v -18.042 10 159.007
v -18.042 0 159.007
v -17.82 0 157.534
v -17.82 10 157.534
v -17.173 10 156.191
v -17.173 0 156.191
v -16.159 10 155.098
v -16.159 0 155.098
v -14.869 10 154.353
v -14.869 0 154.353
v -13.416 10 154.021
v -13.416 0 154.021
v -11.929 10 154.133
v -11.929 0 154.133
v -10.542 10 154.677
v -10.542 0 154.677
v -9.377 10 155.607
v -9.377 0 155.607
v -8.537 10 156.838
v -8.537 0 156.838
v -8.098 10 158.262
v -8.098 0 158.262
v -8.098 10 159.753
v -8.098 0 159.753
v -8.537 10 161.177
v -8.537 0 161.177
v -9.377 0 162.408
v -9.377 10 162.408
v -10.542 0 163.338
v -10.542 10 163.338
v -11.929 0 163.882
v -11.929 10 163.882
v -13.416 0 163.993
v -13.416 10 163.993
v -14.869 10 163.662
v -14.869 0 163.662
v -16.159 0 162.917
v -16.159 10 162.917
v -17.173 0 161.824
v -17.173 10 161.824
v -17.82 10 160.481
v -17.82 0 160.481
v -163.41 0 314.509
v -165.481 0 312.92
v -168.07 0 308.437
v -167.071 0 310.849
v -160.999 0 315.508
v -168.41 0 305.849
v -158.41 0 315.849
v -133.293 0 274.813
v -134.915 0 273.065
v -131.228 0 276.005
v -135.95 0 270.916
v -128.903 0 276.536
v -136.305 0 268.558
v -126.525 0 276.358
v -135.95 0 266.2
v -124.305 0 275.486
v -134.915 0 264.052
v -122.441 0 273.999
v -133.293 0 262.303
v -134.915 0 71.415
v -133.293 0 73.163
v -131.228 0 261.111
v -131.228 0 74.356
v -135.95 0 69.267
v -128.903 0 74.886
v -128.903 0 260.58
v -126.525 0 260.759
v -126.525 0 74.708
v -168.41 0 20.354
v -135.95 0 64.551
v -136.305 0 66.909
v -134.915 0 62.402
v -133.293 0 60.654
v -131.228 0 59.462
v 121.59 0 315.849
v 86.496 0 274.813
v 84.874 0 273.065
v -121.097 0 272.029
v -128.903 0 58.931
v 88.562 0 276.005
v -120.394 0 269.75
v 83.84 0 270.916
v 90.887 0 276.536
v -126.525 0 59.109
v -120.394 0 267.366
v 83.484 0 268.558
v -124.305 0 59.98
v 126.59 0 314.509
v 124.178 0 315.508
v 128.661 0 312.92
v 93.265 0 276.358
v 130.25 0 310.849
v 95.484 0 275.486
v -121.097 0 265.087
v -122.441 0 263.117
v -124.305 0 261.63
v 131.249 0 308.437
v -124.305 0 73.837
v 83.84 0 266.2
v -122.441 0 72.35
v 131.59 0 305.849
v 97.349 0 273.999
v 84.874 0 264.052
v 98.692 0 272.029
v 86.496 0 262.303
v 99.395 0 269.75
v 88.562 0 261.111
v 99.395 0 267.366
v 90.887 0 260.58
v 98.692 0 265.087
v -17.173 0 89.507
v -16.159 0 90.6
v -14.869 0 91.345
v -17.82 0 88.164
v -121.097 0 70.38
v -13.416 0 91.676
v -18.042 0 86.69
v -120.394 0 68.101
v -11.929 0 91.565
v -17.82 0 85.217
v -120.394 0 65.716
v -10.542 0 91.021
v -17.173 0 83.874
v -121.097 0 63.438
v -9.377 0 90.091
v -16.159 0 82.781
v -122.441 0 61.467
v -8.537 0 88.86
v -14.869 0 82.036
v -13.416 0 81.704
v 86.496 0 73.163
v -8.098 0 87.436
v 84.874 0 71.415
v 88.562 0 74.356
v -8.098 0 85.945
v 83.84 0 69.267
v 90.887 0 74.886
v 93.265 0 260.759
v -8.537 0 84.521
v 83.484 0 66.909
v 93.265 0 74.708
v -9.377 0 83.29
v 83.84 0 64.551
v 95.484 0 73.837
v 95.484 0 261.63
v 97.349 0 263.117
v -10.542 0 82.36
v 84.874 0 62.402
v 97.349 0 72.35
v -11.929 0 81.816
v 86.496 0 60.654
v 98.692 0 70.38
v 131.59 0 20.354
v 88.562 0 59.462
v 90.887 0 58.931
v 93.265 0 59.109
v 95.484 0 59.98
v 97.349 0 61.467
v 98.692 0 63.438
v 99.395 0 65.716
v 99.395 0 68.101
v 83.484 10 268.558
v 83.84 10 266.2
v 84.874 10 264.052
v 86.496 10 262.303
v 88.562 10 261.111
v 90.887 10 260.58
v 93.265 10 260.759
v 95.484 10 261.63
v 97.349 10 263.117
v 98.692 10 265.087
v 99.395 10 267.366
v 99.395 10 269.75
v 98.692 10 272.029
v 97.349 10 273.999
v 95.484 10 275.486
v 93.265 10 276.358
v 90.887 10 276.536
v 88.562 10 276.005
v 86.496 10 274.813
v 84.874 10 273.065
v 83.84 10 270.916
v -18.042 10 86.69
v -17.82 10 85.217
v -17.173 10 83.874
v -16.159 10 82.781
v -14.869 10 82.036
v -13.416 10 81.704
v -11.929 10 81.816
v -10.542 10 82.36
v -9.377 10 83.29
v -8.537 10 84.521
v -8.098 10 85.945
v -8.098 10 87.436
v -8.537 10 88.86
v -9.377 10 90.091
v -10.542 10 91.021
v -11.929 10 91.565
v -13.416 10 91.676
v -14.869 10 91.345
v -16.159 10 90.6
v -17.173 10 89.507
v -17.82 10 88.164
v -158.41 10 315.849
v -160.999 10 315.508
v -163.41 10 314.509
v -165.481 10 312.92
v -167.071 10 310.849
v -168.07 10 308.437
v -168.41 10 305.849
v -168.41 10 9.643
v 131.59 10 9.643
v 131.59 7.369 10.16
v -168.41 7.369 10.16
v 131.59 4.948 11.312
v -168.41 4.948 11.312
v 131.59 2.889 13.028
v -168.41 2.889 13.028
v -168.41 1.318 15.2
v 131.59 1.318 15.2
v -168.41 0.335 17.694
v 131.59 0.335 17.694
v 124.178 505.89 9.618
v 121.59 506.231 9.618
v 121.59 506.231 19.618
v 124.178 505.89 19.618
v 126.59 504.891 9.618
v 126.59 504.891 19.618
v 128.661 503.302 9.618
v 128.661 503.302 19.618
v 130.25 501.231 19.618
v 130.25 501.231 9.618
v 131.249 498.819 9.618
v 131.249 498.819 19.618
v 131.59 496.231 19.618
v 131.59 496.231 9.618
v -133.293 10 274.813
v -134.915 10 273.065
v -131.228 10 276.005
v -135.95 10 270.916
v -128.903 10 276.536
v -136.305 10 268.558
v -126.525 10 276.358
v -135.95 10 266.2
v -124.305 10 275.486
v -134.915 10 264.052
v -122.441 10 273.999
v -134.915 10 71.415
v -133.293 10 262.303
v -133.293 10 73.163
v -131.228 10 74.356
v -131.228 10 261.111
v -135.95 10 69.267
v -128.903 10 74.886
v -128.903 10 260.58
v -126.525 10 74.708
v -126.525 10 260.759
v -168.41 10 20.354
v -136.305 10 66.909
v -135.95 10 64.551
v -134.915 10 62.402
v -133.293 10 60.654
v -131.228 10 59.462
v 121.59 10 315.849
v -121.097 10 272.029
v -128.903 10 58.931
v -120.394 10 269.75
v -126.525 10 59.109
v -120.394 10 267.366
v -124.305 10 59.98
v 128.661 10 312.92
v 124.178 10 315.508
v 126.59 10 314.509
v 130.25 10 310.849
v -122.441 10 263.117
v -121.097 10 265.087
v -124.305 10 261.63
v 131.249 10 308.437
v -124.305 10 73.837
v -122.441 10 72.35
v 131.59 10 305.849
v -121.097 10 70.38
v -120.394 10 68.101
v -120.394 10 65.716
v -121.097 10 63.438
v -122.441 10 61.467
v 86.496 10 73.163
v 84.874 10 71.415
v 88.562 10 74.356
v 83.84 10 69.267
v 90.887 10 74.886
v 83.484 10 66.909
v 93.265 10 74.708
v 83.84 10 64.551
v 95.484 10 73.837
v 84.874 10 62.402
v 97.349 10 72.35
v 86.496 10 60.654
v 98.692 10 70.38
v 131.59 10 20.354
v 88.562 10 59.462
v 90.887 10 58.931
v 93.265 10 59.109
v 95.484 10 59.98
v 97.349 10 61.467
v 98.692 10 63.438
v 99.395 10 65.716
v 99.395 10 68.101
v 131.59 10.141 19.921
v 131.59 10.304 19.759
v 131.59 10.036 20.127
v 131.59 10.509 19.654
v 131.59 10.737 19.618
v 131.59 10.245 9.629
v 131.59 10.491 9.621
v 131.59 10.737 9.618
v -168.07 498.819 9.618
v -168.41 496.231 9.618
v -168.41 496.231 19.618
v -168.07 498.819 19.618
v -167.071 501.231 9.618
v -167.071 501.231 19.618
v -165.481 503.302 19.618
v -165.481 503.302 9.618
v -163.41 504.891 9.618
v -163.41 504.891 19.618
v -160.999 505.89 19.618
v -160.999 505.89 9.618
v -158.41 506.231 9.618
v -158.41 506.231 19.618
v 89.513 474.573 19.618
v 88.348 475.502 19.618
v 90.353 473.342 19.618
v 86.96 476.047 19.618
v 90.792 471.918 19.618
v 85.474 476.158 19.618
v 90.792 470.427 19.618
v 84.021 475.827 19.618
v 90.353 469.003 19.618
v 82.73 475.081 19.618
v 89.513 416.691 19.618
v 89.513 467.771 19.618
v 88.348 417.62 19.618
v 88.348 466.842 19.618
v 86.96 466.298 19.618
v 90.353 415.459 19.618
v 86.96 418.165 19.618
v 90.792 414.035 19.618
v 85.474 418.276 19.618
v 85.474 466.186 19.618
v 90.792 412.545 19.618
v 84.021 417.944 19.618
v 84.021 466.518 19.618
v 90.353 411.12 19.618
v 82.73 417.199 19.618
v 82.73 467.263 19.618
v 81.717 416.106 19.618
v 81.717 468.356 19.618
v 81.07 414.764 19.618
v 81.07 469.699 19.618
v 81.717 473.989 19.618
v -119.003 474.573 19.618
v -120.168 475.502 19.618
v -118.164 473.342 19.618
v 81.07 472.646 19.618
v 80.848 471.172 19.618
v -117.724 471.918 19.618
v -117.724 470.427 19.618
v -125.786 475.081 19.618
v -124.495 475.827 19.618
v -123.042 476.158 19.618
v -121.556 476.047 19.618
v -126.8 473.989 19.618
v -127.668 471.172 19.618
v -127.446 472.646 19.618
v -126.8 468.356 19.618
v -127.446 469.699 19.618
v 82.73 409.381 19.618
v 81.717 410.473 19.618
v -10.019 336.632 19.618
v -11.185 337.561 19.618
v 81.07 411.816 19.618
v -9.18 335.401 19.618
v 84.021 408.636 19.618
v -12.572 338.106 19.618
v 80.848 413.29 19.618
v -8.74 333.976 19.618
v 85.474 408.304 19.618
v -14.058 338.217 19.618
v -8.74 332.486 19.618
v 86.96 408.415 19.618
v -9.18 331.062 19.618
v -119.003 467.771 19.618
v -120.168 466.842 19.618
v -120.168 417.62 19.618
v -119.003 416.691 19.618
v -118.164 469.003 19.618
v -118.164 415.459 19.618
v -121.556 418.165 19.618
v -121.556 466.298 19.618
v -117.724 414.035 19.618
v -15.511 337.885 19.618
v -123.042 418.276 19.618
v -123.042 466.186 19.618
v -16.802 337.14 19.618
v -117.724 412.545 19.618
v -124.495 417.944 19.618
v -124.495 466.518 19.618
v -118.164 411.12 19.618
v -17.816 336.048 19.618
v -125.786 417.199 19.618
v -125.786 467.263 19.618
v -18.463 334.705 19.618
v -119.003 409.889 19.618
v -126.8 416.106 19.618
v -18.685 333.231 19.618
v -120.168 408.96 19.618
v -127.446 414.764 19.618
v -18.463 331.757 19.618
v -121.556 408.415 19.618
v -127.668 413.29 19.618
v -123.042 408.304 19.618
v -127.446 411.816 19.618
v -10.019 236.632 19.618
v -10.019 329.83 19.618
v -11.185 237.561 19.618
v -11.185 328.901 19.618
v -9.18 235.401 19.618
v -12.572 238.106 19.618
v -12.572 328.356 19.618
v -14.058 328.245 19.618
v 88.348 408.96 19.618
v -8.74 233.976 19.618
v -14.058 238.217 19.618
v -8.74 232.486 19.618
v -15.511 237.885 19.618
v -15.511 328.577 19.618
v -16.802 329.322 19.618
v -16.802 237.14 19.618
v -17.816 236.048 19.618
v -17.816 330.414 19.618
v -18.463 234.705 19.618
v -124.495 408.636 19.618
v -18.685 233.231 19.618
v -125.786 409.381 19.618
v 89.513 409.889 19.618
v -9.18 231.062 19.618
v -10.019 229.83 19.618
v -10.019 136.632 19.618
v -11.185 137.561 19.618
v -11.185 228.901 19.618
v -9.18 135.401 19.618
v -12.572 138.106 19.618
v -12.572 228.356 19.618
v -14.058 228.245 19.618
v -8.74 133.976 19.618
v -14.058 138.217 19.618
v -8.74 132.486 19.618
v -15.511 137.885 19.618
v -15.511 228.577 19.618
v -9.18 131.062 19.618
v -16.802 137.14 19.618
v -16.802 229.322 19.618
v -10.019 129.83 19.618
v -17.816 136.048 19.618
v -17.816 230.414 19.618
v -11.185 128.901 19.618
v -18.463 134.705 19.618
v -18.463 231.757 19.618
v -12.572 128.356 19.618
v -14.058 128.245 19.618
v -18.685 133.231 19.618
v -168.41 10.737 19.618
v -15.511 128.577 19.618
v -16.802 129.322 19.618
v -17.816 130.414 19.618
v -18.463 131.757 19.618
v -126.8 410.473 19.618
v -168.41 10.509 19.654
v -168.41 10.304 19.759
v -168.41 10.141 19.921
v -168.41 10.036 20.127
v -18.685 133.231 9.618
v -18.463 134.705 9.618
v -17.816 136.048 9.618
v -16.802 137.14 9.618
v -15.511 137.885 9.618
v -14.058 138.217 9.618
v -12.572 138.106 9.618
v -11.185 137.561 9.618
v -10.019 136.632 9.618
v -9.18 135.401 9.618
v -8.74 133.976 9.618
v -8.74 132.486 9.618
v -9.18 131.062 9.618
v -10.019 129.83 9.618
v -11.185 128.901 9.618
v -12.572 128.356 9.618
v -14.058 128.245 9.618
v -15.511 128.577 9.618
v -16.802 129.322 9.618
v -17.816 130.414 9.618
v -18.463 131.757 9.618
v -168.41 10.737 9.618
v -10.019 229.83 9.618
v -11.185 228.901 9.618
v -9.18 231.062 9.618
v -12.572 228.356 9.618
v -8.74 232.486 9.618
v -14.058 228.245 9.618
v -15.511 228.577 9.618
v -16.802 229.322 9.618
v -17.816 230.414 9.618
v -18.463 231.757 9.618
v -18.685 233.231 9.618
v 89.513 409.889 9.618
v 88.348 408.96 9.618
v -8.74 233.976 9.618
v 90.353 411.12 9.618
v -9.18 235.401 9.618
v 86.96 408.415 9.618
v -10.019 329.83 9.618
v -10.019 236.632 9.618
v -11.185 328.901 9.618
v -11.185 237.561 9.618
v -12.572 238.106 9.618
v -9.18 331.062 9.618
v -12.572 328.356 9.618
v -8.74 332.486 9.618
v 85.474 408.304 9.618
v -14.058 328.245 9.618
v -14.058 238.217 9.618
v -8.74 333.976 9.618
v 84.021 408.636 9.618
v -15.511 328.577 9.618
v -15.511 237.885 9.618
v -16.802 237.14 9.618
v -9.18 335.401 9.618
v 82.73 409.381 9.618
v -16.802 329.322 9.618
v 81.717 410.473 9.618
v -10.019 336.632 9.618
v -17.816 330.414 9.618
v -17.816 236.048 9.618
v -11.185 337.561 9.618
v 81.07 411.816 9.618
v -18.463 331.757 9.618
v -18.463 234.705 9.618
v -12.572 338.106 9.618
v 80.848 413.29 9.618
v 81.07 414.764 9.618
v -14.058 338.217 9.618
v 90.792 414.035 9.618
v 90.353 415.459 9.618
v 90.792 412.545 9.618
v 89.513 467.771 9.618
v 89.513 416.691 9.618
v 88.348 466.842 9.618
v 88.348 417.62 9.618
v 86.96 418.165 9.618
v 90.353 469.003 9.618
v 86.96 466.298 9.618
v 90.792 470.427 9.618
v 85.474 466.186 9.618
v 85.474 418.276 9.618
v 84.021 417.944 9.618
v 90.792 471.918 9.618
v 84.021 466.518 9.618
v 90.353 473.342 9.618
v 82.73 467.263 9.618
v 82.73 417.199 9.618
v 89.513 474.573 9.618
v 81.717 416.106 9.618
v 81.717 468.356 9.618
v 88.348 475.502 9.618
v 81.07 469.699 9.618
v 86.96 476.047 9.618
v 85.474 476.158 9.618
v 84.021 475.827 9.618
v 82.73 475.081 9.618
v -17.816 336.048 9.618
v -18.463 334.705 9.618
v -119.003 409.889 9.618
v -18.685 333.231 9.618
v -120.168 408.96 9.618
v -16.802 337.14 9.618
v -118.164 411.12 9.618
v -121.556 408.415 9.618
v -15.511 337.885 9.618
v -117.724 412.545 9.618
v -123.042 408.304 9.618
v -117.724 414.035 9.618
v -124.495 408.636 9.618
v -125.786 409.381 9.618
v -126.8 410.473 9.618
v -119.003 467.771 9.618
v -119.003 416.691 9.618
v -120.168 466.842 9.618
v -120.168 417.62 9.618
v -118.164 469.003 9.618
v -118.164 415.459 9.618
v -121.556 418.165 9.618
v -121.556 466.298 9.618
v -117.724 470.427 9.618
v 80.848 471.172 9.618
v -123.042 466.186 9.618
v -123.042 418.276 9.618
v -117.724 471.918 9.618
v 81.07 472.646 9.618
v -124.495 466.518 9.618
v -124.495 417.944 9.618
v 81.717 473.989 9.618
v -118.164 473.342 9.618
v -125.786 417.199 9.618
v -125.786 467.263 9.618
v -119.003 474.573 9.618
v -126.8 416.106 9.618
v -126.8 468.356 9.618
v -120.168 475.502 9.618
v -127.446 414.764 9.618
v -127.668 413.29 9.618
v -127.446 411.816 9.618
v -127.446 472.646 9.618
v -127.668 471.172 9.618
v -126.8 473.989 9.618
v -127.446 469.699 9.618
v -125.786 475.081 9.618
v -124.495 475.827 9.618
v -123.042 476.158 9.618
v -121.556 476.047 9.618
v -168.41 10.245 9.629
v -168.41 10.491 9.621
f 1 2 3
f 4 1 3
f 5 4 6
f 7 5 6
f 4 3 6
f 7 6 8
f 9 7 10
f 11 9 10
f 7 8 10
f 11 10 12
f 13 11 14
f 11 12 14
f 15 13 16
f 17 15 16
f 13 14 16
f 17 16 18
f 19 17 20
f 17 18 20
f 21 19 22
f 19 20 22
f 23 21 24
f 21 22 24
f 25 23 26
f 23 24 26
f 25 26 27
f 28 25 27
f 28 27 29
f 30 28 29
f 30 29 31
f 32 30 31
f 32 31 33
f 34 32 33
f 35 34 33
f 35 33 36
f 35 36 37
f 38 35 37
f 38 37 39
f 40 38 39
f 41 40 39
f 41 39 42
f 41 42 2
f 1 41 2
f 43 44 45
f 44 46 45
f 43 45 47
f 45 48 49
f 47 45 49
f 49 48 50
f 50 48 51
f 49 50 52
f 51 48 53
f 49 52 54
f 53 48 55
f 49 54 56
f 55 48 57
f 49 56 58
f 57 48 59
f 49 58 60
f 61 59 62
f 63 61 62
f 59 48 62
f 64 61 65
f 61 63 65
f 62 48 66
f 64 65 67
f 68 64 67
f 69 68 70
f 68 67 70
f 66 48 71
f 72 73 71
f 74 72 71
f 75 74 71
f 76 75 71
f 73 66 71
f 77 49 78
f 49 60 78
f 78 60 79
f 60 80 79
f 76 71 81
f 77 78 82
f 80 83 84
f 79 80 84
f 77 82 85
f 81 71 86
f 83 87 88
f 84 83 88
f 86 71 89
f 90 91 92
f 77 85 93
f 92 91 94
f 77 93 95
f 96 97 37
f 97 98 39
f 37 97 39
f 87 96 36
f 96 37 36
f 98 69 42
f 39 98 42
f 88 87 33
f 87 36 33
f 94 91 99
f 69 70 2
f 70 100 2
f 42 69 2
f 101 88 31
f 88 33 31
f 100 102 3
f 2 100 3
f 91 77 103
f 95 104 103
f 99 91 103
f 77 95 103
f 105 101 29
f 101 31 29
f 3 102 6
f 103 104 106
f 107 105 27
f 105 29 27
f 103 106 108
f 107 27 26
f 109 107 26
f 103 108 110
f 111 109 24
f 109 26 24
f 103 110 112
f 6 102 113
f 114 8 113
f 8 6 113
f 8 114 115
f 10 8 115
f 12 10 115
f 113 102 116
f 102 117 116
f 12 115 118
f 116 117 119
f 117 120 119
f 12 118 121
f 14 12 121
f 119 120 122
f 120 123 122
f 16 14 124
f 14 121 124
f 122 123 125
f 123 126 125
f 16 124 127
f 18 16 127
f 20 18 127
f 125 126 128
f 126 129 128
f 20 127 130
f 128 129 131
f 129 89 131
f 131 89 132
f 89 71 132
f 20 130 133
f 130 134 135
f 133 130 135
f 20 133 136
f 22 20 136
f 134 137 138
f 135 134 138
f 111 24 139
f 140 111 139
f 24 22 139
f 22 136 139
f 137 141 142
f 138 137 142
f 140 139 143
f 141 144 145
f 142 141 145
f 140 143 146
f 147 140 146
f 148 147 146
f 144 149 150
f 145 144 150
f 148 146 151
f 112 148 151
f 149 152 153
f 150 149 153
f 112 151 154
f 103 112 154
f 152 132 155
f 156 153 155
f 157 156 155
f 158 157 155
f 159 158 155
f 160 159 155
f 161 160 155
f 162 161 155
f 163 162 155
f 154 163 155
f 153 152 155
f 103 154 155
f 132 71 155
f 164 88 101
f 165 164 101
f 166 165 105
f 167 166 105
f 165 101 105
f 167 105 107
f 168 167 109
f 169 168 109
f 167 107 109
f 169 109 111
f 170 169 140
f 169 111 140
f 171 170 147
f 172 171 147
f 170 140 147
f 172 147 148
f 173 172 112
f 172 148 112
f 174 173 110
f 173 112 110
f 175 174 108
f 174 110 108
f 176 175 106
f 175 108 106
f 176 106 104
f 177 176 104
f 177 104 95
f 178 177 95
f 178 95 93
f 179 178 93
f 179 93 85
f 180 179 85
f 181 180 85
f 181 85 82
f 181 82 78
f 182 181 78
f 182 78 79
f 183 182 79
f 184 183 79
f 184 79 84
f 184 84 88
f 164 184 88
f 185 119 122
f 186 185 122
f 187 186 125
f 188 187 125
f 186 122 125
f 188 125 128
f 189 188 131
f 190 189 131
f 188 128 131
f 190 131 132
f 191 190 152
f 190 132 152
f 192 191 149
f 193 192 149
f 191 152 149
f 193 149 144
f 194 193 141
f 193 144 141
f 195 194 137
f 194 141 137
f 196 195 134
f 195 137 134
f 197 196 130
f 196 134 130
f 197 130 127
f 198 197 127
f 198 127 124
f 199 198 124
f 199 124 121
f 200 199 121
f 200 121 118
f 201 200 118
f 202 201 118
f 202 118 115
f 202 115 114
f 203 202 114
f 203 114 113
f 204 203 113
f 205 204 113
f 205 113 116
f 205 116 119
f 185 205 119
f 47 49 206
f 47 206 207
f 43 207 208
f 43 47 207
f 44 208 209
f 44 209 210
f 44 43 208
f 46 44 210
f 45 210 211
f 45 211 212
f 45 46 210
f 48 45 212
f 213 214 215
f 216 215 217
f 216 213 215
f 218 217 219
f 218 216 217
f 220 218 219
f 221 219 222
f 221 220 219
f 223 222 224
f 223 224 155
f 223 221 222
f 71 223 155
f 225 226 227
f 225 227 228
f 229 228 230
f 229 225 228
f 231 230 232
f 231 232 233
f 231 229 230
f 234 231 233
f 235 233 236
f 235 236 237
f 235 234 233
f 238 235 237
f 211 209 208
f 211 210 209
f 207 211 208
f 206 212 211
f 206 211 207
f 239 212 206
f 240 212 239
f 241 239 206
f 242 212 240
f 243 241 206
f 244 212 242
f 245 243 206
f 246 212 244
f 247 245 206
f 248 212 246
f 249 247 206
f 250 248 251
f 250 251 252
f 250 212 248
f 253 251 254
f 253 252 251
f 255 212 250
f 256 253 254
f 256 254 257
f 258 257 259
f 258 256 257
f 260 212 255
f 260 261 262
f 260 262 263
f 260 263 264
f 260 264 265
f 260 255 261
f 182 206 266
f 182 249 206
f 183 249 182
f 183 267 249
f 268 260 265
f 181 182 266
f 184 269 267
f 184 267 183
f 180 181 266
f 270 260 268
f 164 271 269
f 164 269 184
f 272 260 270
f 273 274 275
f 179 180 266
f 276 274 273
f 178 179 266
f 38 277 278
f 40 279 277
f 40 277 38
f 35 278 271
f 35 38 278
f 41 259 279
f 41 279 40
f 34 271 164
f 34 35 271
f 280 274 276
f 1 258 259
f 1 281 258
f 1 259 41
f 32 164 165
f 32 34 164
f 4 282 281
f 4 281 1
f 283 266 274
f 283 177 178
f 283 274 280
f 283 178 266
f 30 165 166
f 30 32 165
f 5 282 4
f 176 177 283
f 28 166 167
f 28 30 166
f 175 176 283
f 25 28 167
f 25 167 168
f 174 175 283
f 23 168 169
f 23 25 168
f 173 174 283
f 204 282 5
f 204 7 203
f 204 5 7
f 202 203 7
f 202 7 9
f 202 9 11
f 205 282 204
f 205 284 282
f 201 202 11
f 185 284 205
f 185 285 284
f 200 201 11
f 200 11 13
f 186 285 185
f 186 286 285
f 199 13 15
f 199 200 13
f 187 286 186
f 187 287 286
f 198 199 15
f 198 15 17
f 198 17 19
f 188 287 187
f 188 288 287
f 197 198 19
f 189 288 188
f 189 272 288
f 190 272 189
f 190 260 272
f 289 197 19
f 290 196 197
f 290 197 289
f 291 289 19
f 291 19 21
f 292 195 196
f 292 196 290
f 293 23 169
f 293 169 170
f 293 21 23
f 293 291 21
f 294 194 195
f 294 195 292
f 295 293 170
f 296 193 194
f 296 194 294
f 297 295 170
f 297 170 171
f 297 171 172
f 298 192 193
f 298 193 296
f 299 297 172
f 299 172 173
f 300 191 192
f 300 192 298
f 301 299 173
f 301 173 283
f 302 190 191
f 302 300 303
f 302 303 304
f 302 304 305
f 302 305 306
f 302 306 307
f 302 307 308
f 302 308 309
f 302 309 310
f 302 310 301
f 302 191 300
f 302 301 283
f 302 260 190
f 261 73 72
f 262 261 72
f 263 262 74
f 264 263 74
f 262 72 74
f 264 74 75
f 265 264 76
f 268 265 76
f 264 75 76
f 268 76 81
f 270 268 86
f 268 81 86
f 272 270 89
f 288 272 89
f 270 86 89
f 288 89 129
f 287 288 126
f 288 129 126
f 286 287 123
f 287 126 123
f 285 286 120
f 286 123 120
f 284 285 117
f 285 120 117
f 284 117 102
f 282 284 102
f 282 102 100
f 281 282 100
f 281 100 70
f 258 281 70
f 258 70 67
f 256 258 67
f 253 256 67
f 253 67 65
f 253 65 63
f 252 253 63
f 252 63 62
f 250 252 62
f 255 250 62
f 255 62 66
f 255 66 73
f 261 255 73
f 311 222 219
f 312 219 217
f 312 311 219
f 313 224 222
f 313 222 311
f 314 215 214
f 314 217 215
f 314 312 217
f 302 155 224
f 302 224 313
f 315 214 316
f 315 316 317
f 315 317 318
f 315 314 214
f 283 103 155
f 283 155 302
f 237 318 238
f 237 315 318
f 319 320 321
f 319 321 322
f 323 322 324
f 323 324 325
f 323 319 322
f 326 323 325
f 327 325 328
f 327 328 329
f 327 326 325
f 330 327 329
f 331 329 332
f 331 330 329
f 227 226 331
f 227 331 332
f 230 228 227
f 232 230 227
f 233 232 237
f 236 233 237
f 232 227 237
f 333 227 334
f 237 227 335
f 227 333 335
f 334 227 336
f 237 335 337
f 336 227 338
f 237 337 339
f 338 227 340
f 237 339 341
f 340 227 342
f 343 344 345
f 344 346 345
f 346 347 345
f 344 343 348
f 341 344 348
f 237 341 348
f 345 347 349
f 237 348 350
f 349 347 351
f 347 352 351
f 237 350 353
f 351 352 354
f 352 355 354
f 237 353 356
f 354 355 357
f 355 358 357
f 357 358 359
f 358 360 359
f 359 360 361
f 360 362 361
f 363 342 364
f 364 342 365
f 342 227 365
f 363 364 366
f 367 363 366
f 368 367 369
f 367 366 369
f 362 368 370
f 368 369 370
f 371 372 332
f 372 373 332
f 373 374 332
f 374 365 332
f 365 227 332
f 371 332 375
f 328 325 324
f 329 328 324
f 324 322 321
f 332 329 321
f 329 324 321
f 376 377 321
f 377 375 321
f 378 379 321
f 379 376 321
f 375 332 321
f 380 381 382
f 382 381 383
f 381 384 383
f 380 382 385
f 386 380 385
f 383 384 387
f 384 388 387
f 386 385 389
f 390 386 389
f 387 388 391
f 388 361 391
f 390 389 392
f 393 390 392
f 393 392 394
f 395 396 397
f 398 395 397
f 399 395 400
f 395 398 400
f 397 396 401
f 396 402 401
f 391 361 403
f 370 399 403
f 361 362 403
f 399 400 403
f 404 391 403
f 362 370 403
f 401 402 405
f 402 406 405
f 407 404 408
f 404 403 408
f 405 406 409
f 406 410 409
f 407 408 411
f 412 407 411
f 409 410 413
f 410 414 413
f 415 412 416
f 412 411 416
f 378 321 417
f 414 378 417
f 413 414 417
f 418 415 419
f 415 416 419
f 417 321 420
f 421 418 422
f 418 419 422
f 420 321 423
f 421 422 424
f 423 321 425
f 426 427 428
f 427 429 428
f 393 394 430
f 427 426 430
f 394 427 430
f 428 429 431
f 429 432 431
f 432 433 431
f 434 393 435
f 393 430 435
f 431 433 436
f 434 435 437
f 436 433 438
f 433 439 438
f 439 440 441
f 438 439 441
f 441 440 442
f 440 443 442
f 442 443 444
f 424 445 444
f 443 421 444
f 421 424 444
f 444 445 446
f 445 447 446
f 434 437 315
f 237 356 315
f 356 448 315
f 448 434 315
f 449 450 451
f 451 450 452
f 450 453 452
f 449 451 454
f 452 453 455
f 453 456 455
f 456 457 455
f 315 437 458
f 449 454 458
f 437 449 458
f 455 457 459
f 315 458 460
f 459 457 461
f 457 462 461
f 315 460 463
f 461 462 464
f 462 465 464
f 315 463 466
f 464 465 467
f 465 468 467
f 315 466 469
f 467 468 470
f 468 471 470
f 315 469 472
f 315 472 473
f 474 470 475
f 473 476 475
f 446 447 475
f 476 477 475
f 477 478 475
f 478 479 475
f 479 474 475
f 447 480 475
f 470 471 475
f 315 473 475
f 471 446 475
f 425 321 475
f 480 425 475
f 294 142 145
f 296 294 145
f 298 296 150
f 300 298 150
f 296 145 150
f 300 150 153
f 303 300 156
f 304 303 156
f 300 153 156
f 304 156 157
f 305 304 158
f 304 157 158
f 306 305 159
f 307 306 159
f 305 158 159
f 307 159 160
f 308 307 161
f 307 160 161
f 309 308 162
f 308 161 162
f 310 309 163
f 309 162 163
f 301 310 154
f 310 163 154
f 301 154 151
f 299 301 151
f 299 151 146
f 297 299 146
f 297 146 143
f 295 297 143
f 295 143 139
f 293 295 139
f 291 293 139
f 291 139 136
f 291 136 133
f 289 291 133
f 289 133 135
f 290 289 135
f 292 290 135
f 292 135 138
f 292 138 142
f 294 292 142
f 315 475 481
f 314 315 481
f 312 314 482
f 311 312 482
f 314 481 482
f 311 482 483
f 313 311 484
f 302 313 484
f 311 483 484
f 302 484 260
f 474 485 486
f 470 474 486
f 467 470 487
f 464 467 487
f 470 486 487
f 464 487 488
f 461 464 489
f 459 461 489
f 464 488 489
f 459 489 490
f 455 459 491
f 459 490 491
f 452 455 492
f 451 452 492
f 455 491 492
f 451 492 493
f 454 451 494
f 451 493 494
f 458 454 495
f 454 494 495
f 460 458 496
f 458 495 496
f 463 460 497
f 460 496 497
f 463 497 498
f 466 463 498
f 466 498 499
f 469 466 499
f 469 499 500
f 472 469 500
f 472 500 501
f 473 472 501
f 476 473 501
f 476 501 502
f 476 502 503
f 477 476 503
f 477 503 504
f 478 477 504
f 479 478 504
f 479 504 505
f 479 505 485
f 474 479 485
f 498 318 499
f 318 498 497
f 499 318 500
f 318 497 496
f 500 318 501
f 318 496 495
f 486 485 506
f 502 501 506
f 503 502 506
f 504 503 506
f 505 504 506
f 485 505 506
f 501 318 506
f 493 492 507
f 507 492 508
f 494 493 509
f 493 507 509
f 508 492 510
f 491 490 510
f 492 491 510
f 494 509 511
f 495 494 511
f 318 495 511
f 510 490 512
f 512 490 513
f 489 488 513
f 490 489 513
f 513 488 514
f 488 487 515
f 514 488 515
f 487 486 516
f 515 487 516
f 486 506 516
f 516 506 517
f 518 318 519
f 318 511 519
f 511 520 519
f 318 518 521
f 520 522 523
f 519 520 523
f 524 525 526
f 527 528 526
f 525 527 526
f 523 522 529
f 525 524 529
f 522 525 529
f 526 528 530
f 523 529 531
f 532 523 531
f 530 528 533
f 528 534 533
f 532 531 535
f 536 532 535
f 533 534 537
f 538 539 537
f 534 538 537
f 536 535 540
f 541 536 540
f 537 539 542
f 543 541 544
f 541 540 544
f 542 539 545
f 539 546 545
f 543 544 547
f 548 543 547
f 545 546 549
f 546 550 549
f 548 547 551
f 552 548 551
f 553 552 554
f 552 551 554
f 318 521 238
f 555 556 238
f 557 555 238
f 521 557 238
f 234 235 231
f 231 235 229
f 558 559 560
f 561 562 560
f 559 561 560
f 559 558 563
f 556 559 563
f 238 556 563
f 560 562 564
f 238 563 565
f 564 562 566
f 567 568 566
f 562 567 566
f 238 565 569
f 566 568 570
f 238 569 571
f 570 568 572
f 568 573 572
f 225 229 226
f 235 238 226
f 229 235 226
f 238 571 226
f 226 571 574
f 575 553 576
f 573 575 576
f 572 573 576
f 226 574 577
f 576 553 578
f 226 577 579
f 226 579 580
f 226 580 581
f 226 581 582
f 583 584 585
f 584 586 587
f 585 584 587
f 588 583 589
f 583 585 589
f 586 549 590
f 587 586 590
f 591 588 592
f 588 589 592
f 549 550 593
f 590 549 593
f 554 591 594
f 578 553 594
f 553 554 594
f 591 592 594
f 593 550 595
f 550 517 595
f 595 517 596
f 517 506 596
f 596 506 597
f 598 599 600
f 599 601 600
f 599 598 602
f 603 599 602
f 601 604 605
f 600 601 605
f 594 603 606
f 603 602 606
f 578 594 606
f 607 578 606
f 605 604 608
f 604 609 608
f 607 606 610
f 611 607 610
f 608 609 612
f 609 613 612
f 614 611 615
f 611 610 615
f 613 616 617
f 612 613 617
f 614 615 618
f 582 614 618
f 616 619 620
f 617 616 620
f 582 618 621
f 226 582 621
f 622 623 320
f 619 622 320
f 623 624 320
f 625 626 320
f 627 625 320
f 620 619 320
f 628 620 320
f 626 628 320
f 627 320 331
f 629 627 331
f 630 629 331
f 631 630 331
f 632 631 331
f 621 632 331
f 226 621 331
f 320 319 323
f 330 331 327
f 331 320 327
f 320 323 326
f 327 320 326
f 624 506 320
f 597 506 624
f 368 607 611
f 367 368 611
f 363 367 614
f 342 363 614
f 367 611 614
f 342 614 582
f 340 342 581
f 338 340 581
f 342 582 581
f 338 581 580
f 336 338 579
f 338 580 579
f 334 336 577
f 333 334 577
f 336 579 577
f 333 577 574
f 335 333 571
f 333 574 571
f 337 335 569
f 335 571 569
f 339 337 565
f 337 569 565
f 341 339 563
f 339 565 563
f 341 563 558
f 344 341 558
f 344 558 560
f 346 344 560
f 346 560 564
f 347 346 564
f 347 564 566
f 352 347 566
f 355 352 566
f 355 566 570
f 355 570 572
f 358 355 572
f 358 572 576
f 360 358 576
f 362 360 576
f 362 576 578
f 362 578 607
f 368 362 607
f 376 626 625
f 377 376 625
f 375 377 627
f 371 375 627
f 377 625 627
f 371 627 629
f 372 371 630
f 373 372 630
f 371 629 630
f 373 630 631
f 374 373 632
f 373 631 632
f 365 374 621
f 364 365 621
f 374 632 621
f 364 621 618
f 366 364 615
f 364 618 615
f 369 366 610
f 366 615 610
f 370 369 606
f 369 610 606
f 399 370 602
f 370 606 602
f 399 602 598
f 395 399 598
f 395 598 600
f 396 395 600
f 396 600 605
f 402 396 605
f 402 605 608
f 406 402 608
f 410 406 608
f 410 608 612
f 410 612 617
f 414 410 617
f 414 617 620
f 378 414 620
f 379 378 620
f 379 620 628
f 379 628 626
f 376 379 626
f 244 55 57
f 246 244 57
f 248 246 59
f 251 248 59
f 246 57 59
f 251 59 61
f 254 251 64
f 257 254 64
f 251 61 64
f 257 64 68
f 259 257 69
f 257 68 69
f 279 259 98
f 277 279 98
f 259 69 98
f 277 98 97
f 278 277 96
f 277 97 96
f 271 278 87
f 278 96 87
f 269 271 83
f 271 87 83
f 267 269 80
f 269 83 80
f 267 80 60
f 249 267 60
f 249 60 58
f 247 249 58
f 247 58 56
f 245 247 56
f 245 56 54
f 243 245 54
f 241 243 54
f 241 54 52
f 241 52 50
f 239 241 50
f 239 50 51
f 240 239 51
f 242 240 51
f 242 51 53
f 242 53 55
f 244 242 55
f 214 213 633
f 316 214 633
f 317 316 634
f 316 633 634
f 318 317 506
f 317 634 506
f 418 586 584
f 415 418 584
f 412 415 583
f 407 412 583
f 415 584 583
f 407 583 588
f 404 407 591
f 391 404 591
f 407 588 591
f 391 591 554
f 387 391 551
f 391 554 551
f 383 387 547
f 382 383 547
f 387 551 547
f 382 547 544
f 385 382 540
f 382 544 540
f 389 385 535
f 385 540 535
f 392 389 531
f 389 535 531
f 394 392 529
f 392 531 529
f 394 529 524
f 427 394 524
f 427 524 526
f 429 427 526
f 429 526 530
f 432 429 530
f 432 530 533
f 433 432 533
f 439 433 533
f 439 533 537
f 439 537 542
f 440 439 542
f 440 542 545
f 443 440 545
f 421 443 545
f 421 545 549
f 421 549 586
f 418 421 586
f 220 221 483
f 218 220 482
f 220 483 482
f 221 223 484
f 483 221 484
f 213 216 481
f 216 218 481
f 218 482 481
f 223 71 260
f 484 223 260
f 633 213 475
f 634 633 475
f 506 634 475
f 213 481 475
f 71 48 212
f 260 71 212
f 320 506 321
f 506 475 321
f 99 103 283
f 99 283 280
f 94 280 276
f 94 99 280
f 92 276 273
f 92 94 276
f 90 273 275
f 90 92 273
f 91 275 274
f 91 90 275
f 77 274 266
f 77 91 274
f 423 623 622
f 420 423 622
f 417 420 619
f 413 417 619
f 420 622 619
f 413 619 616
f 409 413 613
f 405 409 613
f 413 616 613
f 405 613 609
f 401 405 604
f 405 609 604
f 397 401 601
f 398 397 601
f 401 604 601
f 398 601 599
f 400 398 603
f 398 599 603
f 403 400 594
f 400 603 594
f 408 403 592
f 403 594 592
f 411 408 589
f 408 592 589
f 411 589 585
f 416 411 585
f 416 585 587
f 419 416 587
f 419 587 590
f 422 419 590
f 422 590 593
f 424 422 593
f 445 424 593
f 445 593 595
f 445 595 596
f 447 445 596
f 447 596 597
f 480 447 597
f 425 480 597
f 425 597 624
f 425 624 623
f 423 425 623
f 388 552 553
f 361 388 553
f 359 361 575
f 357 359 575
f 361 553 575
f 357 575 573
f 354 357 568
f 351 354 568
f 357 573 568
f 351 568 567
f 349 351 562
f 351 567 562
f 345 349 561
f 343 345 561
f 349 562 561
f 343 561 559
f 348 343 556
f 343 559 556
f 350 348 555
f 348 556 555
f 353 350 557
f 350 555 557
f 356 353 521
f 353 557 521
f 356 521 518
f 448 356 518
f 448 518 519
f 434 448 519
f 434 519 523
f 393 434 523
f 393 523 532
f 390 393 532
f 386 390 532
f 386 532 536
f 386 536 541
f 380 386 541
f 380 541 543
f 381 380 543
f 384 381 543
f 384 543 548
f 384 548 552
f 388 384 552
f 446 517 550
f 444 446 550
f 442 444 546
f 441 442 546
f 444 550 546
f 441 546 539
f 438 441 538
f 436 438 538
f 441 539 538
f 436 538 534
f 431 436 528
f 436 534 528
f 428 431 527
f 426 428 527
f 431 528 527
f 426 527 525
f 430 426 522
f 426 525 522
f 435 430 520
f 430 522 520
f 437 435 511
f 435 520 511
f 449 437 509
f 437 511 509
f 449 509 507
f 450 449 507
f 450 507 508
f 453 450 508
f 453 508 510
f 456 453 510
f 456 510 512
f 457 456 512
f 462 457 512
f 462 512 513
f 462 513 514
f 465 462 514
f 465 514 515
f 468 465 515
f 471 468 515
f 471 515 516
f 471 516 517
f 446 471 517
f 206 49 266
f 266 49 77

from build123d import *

# Parameters (mm, degrees)
SKETCH3_W              = 300
SKETCH3_H              = 800
BASE_FLANGE1_DEPTH     = 10
SKETCHED_START         = -168.410340007
SKETCHED_BEND1_DEPTH   = 300
SKETCHED_BEND1_2_DEPTH = 300
BREAK_CORNER1_DEPTH    = 10
BREAK_CORNER1_START    = 9.617841009
BREAK_CORNER1_2_DEPTH  = 10
F_10_0MM_DOWEL_HOLE1_D = 10
F_10_0MM_DOWEL_HOLE2_D = 10
F_10_0MM_DOWEL_HOLE3_D = 10
F_16_0MM_DOWEL_HOLE1_D = 16


# Read off the part's stored shape, not the designer's step: Sketched Bend1, Break-Corner1
# Sheet-metal steps are written as plain solids
with BuildPart() as part:
    # Sketch3 → Base-Flange1 (new body)
    with BuildSketch(Plane(origin=(0, 0, 0), x_dir=(1, 0, 0), z_dir=(0, 1, 0))):
        with Locations((-18.410340007, 84.151074095)):
            Rectangle(SKETCH3_W, SKETCH3_H)
    extrude(amount=BASE_FLANGE1_DEPTH)

    # Sketched Bend1 outline → Sketched Bend1 (cut)
    with BuildSketch(Plane.YZ.offset(SKETCHED_START)):
        with BuildLine():
            Line((10, -484.151074095), (10, 9.643138567))
            ThreePointArc((10, 9.643138567), (2.888569702, 13.027572646), (0, 20.354441009))
            Line((0, 20.354441009), (0, -484.151074095))
            Line((0, -484.151074095), (10, -484.151074095))
        make_face()
    extrude(amount=SKETCHED_BEND1_DEPTH, mode=Mode.SUBTRACT)

    # Sketched Bend1 2 outline → Sketched Bend1 2 (add)
    with BuildSketch(Plane.YZ.offset(SKETCHED_START)):
        with BuildLine():
            Line((10.7366, 9.617841009), (506.231084896, 9.617841009))
            Line((506.231084896, 9.617841009), (506.231084896, 19.617841009))
            Line((506.231084896, 19.617841009), (10.7366, 19.617841009))
            ThreePointArc((10.7366, 19.617841009), (10.215745145, 19.833586154), (10, 20.354441009))
            Line((10, 20.354441009), (10, 9.643138567))
            ThreePointArc((10, 9.643138567), (10.368082861, 9.624167262), (10.7366, 9.617841009))
        make_face()
    extrude(amount=SKETCHED_BEND1_2_DEPTH)

    # Break-Corner1 outline → Break-Corner1 (cut)
    with BuildSketch(Plane(origin=(0, 0, 0), x_dir=(1, 0, 0), z_dir=(0, 1, 0))):
        with BuildLine():
            Line((131.589659993, -315.848925905), (131.589659993, -305.848925905))
            ThreePointArc((131.589659993, -305.848925905), (128.660727805, -312.919993717), (121.589659993, -315.848925905))
            Line((121.589659993, -315.848925905), (131.589659993, -315.848925905))
        make_face()
        with BuildLine():
            Line((-168.410340007, -315.848925905), (-158.410340007, -315.848925905))
            ThreePointArc((-158.410340007, -315.848925905), (-165.481407819, -312.919993717), (-168.410340007, -305.848925905))
            Line((-168.410340007, -305.848925905), (-168.410340007, -315.848925905))
        make_face()
    extrude(amount=BREAK_CORNER1_DEPTH, mode=Mode.SUBTRACT)

    # Break-Corner1 2 outline → Break-Corner1 2 (cut)
    with BuildSketch(Plane.XY.offset(BREAK_CORNER1_START)):
        with BuildLine():
            Line((131.589659993, 506.231084896), (121.589659993, 506.231084896))
            ThreePointArc((121.589659993, 506.231084896), (128.660727805, 503.302152708), (131.589659993, 496.231084896))
            Line((131.589659993, 496.231084896), (131.589659993, 506.231084896))
        make_face()
        with BuildLine():
            ThreePointArc((-168.410340007, 496.231084896), (-165.481407819, 503.302152708), (-158.410340007, 506.231084896))
            Line((-158.410340007, 506.231084896), (-168.410340007, 506.231084896))
            Line((-168.410340007, 506.231084896), (-168.410340007, 496.231084896))
        make_face()
    extrude(amount=BREAK_CORNER1_2_DEPTH, mode=Mode.SUBTRACT)

    # Ø10.0mm Dowel Hole1 (through all)
    with Locations(Plane.XY.offset(19.617841009)):
        with Locations((-13.684653237, 333.231084896), (-13.684653237, 233.231084896), (-13.684653237, 133.231084896)):
            Hole(F_10_0MM_DOWEL_HOLE1_D / 2)

    # Ø10.0mm Dowel Hole2 (through all)
    with Locations(Plane(origin=(0, 10, 0), x_dir=(1, 0, 0), z_dir=(0, 1, 0))):
        with Locations((-13.042040007, -86.690456915), (-13.042040007, -159.007394895)):
            Hole(F_10_0MM_DOWEL_HOLE2_D / 2)

    # Ø10.0mm Dowel Hole3 (through all)
    with Locations(Plane.XY.offset(19.617841009)):
        with Locations((85.847745748, 471.172292647), (85.847745748, 413.289877144), (-122.668425763, 413.289877144), (-122.668425763, 471.172292647)):
            Hole(F_10_0MM_DOWEL_HOLE3_D / 2)

    # Ø16.0mm Dowel Hole1 (through all)
    with Locations(Plane(origin=(0, 10, 0), x_dir=(1, 0, 0), z_dir=(0, 1, 0))):
        with Locations((-128.305039397, -66.908688048), (91.484359382, -66.908688048), (91.484359382, -268.558078866), (-128.305039397, -268.558078866)):
            Hole(F_16_0MM_DOWEL_HOLE1_D / 2)


solid = part.part
